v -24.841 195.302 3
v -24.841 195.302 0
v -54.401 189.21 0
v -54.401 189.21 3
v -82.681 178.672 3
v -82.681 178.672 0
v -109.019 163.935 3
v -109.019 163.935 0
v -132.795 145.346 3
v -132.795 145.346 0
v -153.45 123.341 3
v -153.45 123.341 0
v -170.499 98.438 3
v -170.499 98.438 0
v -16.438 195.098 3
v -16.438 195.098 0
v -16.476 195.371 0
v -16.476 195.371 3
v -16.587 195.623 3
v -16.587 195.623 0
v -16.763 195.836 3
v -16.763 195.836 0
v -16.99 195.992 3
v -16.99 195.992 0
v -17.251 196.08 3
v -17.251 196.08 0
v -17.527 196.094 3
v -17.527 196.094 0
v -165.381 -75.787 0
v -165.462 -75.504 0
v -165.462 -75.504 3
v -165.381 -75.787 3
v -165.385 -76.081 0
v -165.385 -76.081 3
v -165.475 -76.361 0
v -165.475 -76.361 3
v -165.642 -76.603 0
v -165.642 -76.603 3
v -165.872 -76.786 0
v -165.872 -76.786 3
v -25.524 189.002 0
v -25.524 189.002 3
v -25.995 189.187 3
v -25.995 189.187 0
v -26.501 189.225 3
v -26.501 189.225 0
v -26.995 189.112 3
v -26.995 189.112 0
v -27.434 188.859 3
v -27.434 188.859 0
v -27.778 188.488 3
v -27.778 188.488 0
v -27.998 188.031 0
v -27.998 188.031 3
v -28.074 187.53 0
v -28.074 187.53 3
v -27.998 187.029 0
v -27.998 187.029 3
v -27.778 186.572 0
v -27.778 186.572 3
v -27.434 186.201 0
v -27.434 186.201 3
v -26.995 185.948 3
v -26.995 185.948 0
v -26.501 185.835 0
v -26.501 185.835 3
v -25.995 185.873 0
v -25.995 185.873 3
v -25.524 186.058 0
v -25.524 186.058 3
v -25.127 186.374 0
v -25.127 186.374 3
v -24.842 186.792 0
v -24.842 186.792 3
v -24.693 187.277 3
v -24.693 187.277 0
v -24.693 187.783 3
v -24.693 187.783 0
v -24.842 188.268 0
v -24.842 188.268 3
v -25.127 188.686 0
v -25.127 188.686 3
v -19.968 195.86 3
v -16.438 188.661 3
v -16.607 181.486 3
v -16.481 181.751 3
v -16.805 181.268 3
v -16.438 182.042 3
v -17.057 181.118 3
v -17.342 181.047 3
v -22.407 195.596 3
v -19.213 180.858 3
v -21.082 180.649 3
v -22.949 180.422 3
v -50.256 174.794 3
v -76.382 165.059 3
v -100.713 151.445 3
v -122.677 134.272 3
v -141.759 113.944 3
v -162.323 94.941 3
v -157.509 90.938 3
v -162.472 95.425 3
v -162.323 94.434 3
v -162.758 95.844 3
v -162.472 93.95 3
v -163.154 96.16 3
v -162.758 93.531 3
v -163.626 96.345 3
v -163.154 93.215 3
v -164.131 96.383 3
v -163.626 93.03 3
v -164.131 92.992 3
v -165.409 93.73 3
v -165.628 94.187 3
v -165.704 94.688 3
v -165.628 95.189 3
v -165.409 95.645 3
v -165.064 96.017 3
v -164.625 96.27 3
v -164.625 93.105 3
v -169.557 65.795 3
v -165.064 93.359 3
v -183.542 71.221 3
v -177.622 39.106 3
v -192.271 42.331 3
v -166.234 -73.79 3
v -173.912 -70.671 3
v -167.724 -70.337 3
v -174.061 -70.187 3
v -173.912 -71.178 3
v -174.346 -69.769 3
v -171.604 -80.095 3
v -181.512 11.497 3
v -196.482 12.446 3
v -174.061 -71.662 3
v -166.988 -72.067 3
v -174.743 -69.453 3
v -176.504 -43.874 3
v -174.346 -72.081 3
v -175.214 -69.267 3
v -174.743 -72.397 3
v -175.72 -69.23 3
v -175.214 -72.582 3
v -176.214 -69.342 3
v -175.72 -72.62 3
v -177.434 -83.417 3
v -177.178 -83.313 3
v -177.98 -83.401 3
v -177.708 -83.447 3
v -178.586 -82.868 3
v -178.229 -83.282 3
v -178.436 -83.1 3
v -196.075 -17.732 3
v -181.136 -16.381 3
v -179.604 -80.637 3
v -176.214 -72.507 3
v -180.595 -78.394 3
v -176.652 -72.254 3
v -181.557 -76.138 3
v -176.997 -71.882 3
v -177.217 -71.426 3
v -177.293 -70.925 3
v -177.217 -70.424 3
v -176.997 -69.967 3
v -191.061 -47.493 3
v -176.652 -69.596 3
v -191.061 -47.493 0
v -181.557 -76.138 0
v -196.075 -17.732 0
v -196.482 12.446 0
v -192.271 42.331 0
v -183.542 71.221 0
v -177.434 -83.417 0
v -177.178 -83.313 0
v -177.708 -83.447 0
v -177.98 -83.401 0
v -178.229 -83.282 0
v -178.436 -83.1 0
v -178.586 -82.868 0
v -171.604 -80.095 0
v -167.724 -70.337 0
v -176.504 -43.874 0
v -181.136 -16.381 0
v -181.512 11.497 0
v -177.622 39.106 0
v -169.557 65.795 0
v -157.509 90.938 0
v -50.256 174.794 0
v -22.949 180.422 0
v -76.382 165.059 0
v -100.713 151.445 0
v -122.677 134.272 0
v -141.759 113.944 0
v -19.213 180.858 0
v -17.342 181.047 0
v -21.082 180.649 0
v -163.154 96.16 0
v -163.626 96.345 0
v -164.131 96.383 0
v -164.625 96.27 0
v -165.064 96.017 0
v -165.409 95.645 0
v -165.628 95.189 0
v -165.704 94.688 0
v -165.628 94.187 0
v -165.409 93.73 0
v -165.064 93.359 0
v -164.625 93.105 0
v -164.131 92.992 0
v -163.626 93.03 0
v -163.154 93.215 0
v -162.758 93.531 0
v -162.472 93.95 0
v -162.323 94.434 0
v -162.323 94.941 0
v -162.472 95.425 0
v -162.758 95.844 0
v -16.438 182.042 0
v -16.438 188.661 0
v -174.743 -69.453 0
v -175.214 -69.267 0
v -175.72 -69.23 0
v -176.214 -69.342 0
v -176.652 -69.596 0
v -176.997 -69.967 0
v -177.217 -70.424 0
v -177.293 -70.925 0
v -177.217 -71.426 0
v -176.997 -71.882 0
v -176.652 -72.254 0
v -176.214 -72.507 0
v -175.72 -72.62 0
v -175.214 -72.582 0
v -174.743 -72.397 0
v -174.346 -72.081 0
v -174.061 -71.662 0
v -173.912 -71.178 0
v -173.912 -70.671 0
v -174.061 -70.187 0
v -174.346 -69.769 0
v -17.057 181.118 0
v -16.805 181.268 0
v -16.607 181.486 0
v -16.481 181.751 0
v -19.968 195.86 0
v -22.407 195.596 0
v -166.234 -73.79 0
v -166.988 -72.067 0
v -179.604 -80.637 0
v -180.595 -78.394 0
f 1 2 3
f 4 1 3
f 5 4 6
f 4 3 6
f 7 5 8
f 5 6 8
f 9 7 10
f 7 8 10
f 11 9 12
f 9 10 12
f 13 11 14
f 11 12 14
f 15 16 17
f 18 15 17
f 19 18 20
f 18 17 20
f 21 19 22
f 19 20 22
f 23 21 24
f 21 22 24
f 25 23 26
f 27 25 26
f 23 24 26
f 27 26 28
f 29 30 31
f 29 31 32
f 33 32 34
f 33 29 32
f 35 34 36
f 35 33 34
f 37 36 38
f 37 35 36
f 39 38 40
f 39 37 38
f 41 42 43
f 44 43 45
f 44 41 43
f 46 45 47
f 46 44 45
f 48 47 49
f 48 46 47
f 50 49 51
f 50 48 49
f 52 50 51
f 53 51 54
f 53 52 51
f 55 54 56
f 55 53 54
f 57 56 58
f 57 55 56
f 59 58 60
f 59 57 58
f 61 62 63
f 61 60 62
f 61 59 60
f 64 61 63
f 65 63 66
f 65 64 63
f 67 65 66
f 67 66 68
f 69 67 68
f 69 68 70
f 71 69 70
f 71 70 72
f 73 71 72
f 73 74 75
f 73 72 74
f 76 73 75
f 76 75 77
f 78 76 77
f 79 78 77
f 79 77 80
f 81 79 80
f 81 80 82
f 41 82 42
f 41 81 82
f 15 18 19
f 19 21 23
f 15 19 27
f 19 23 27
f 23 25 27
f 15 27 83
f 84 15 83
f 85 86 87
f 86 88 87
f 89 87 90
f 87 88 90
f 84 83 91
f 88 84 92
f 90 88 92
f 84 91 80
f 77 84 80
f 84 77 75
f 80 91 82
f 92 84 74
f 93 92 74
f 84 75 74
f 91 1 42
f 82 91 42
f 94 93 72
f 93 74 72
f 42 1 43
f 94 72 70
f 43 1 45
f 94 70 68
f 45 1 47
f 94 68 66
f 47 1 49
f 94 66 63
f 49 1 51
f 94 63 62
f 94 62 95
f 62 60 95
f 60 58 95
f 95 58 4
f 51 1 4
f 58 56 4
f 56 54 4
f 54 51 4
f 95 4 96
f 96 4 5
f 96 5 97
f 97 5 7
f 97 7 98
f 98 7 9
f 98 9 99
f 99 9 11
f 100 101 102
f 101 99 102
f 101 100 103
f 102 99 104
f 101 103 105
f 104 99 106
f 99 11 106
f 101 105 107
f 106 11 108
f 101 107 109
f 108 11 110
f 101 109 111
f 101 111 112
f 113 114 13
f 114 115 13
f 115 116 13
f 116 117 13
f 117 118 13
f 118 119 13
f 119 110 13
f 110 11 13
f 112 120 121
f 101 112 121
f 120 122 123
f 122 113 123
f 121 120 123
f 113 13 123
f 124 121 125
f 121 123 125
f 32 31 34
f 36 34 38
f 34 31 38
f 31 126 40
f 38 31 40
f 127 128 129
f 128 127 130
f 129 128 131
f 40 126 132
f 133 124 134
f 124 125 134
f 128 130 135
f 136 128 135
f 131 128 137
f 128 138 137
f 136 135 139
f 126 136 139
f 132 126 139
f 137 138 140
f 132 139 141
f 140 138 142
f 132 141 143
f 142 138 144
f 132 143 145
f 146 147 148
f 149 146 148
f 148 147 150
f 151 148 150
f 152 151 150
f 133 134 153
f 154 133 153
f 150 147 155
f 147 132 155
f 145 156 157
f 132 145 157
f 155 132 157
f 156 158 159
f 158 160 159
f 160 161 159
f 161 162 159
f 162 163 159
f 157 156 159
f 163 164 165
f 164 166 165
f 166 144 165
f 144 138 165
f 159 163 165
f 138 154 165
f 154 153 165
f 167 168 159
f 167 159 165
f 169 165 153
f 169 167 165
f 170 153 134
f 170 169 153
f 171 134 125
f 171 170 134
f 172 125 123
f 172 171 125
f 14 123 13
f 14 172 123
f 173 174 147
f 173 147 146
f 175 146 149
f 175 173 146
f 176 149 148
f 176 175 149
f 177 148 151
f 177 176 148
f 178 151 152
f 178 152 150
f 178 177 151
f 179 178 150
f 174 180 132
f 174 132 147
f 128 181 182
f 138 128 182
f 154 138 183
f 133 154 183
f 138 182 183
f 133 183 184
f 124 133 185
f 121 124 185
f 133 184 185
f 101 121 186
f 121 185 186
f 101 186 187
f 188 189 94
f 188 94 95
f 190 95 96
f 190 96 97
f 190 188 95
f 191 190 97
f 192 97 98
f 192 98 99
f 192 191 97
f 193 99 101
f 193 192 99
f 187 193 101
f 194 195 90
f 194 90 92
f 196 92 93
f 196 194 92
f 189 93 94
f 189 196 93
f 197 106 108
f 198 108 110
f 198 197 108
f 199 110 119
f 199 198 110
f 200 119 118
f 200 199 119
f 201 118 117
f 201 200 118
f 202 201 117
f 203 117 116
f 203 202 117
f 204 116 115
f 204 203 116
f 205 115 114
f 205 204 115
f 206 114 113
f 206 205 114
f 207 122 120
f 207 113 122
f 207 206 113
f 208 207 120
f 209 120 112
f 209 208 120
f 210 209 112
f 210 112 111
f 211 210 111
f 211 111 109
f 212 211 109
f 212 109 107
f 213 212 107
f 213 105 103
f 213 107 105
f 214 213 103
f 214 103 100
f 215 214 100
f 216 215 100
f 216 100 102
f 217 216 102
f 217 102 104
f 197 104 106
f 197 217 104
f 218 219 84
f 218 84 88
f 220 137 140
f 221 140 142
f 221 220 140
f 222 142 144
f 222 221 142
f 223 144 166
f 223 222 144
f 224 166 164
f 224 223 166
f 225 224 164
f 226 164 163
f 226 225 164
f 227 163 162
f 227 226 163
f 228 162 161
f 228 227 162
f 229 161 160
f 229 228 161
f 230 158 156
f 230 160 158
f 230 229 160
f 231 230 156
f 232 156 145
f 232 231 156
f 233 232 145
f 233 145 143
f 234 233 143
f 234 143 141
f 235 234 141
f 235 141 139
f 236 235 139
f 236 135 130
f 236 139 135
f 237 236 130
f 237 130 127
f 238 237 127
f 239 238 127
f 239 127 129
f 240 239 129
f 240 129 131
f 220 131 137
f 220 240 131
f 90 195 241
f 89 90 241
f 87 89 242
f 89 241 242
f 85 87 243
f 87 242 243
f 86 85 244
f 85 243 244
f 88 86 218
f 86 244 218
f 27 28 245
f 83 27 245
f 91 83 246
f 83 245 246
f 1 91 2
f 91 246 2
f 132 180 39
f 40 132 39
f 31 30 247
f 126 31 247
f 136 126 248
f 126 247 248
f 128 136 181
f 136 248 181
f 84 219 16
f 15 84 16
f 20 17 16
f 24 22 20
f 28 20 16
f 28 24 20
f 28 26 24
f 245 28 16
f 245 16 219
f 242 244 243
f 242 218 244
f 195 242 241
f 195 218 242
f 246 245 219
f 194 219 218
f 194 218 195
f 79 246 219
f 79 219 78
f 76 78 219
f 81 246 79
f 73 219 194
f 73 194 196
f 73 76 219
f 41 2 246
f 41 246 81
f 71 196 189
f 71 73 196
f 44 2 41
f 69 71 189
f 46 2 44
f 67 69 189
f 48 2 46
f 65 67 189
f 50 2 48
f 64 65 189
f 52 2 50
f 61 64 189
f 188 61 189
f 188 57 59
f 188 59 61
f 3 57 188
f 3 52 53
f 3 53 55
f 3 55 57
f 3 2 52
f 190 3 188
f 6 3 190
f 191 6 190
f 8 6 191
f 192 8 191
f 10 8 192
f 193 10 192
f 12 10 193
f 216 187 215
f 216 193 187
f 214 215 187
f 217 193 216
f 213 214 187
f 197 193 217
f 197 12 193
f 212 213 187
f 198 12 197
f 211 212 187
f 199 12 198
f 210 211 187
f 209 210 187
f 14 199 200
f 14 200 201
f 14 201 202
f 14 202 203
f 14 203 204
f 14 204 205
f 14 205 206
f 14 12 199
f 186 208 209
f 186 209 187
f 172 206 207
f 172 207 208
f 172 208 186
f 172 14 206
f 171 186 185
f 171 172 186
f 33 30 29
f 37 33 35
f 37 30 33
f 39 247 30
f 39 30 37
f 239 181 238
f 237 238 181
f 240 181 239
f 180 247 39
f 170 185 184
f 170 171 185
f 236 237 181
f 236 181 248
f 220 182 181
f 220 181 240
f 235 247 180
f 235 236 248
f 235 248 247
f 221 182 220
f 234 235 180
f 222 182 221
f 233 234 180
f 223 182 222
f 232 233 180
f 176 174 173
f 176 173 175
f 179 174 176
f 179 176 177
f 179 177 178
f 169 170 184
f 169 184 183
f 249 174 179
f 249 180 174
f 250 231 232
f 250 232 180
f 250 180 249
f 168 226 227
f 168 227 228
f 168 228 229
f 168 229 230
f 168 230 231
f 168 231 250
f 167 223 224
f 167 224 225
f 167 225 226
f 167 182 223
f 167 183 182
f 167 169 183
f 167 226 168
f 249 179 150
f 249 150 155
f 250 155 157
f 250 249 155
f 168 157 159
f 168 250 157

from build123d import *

# Parameters (mm, degrees)
PAD021_DEPTH                        = 3
SKETCH083_R                         = 1.7
POCKET041_DEPTH                     = 0.001
POCKET041_DEPTH_BACK                = 3.001
SKETCH084_R                         = 1.7
POCKET042_DEPTH                     = 0.001
POCKET042_DEPTH_BACK                = 3.001
BODY001003005003013_PLACEMENT_ANGLE = 60


with BuildPart() as part:
    # Sketch082 → Pad021 (new body)
    with BuildSketch(Plane.XY):
        with BuildLine():
            ThreePointArc((156.715765, 119.164267), (87.462654, 176.380945), (0, 196.875477))
            Line((0, 196.875477), (0, 181.875477))
            ThreePointArc((144.775545, 110.085106), (80.798849, 162.942429), (0, 181.875477))
            ThreePointArc((148.119912, 105.542318), (146.465342, 107.826679), (144.775545, 110.085106))
            ThreePointArc((148.119912, 105.542318), (148.721895, 105.145439), (149.434315, 105.256592))
            Line((155.166125, 108.565855), (149.434315, 105.256592))
            Line((155.166125, 108.565855), (160.740736, 111.784358))
            ThreePointArc((160.740736, 111.784358), (161.217235, 112.43486), (161.058811, 113.225496))
            ThreePointArc((161.058811, 113.225496), (158.915032, 116.215171), (156.715765, 119.164267))
        make_face()
    pad021 = extrude(amount=PAD021_DEPTH)

    # Mirrored029: Pad021 across Sketch082 V_Axis
    add(pad021.mirror(Plane(origin=(0, 0, 0), x_dir=(0, 0, 1), z_dir=(1, 0, 0))))

    # Sketch083 → Pocket041 (cut, two sides)
    with BuildSketch(Plane.XY) as pocket041_sk:
        with Locations((149.218956, 116.605208)):
            Circle(SKETCH083_R)
        with Locations((-149.218956, 116.605208)):
            Circle(SKETCH083_R)
    extrude(amount=-POCKET041_DEPTH, mode=Mode.SUBTRACT)
    extrude(pocket041_sk.sketch, amount=POCKET041_DEPTH_BACK, mode=Mode.SUBTRACT)

    # Sketch084 → Pocket042 (cut, two sides)
    with BuildSketch(Plane.XY) as pocket042_sk:
        with Locations((0, 189.375477)):
            Circle(SKETCH084_R)
    extrude(amount=-POCKET042_DEPTH, mode=Mode.SUBTRACT)
    extrude(pocket042_sk.sketch, amount=POCKET042_DEPTH_BACK, mode=Mode.SUBTRACT)


with BuildPart() as part_1:
    # Body001003005003013 placement: moved
    add(part.part.rotate(Axis((0, 0, 0), (0, 0, 1)), BODY001003005003013_PLACEMENT_ANGLE))


solid = part_1.part
